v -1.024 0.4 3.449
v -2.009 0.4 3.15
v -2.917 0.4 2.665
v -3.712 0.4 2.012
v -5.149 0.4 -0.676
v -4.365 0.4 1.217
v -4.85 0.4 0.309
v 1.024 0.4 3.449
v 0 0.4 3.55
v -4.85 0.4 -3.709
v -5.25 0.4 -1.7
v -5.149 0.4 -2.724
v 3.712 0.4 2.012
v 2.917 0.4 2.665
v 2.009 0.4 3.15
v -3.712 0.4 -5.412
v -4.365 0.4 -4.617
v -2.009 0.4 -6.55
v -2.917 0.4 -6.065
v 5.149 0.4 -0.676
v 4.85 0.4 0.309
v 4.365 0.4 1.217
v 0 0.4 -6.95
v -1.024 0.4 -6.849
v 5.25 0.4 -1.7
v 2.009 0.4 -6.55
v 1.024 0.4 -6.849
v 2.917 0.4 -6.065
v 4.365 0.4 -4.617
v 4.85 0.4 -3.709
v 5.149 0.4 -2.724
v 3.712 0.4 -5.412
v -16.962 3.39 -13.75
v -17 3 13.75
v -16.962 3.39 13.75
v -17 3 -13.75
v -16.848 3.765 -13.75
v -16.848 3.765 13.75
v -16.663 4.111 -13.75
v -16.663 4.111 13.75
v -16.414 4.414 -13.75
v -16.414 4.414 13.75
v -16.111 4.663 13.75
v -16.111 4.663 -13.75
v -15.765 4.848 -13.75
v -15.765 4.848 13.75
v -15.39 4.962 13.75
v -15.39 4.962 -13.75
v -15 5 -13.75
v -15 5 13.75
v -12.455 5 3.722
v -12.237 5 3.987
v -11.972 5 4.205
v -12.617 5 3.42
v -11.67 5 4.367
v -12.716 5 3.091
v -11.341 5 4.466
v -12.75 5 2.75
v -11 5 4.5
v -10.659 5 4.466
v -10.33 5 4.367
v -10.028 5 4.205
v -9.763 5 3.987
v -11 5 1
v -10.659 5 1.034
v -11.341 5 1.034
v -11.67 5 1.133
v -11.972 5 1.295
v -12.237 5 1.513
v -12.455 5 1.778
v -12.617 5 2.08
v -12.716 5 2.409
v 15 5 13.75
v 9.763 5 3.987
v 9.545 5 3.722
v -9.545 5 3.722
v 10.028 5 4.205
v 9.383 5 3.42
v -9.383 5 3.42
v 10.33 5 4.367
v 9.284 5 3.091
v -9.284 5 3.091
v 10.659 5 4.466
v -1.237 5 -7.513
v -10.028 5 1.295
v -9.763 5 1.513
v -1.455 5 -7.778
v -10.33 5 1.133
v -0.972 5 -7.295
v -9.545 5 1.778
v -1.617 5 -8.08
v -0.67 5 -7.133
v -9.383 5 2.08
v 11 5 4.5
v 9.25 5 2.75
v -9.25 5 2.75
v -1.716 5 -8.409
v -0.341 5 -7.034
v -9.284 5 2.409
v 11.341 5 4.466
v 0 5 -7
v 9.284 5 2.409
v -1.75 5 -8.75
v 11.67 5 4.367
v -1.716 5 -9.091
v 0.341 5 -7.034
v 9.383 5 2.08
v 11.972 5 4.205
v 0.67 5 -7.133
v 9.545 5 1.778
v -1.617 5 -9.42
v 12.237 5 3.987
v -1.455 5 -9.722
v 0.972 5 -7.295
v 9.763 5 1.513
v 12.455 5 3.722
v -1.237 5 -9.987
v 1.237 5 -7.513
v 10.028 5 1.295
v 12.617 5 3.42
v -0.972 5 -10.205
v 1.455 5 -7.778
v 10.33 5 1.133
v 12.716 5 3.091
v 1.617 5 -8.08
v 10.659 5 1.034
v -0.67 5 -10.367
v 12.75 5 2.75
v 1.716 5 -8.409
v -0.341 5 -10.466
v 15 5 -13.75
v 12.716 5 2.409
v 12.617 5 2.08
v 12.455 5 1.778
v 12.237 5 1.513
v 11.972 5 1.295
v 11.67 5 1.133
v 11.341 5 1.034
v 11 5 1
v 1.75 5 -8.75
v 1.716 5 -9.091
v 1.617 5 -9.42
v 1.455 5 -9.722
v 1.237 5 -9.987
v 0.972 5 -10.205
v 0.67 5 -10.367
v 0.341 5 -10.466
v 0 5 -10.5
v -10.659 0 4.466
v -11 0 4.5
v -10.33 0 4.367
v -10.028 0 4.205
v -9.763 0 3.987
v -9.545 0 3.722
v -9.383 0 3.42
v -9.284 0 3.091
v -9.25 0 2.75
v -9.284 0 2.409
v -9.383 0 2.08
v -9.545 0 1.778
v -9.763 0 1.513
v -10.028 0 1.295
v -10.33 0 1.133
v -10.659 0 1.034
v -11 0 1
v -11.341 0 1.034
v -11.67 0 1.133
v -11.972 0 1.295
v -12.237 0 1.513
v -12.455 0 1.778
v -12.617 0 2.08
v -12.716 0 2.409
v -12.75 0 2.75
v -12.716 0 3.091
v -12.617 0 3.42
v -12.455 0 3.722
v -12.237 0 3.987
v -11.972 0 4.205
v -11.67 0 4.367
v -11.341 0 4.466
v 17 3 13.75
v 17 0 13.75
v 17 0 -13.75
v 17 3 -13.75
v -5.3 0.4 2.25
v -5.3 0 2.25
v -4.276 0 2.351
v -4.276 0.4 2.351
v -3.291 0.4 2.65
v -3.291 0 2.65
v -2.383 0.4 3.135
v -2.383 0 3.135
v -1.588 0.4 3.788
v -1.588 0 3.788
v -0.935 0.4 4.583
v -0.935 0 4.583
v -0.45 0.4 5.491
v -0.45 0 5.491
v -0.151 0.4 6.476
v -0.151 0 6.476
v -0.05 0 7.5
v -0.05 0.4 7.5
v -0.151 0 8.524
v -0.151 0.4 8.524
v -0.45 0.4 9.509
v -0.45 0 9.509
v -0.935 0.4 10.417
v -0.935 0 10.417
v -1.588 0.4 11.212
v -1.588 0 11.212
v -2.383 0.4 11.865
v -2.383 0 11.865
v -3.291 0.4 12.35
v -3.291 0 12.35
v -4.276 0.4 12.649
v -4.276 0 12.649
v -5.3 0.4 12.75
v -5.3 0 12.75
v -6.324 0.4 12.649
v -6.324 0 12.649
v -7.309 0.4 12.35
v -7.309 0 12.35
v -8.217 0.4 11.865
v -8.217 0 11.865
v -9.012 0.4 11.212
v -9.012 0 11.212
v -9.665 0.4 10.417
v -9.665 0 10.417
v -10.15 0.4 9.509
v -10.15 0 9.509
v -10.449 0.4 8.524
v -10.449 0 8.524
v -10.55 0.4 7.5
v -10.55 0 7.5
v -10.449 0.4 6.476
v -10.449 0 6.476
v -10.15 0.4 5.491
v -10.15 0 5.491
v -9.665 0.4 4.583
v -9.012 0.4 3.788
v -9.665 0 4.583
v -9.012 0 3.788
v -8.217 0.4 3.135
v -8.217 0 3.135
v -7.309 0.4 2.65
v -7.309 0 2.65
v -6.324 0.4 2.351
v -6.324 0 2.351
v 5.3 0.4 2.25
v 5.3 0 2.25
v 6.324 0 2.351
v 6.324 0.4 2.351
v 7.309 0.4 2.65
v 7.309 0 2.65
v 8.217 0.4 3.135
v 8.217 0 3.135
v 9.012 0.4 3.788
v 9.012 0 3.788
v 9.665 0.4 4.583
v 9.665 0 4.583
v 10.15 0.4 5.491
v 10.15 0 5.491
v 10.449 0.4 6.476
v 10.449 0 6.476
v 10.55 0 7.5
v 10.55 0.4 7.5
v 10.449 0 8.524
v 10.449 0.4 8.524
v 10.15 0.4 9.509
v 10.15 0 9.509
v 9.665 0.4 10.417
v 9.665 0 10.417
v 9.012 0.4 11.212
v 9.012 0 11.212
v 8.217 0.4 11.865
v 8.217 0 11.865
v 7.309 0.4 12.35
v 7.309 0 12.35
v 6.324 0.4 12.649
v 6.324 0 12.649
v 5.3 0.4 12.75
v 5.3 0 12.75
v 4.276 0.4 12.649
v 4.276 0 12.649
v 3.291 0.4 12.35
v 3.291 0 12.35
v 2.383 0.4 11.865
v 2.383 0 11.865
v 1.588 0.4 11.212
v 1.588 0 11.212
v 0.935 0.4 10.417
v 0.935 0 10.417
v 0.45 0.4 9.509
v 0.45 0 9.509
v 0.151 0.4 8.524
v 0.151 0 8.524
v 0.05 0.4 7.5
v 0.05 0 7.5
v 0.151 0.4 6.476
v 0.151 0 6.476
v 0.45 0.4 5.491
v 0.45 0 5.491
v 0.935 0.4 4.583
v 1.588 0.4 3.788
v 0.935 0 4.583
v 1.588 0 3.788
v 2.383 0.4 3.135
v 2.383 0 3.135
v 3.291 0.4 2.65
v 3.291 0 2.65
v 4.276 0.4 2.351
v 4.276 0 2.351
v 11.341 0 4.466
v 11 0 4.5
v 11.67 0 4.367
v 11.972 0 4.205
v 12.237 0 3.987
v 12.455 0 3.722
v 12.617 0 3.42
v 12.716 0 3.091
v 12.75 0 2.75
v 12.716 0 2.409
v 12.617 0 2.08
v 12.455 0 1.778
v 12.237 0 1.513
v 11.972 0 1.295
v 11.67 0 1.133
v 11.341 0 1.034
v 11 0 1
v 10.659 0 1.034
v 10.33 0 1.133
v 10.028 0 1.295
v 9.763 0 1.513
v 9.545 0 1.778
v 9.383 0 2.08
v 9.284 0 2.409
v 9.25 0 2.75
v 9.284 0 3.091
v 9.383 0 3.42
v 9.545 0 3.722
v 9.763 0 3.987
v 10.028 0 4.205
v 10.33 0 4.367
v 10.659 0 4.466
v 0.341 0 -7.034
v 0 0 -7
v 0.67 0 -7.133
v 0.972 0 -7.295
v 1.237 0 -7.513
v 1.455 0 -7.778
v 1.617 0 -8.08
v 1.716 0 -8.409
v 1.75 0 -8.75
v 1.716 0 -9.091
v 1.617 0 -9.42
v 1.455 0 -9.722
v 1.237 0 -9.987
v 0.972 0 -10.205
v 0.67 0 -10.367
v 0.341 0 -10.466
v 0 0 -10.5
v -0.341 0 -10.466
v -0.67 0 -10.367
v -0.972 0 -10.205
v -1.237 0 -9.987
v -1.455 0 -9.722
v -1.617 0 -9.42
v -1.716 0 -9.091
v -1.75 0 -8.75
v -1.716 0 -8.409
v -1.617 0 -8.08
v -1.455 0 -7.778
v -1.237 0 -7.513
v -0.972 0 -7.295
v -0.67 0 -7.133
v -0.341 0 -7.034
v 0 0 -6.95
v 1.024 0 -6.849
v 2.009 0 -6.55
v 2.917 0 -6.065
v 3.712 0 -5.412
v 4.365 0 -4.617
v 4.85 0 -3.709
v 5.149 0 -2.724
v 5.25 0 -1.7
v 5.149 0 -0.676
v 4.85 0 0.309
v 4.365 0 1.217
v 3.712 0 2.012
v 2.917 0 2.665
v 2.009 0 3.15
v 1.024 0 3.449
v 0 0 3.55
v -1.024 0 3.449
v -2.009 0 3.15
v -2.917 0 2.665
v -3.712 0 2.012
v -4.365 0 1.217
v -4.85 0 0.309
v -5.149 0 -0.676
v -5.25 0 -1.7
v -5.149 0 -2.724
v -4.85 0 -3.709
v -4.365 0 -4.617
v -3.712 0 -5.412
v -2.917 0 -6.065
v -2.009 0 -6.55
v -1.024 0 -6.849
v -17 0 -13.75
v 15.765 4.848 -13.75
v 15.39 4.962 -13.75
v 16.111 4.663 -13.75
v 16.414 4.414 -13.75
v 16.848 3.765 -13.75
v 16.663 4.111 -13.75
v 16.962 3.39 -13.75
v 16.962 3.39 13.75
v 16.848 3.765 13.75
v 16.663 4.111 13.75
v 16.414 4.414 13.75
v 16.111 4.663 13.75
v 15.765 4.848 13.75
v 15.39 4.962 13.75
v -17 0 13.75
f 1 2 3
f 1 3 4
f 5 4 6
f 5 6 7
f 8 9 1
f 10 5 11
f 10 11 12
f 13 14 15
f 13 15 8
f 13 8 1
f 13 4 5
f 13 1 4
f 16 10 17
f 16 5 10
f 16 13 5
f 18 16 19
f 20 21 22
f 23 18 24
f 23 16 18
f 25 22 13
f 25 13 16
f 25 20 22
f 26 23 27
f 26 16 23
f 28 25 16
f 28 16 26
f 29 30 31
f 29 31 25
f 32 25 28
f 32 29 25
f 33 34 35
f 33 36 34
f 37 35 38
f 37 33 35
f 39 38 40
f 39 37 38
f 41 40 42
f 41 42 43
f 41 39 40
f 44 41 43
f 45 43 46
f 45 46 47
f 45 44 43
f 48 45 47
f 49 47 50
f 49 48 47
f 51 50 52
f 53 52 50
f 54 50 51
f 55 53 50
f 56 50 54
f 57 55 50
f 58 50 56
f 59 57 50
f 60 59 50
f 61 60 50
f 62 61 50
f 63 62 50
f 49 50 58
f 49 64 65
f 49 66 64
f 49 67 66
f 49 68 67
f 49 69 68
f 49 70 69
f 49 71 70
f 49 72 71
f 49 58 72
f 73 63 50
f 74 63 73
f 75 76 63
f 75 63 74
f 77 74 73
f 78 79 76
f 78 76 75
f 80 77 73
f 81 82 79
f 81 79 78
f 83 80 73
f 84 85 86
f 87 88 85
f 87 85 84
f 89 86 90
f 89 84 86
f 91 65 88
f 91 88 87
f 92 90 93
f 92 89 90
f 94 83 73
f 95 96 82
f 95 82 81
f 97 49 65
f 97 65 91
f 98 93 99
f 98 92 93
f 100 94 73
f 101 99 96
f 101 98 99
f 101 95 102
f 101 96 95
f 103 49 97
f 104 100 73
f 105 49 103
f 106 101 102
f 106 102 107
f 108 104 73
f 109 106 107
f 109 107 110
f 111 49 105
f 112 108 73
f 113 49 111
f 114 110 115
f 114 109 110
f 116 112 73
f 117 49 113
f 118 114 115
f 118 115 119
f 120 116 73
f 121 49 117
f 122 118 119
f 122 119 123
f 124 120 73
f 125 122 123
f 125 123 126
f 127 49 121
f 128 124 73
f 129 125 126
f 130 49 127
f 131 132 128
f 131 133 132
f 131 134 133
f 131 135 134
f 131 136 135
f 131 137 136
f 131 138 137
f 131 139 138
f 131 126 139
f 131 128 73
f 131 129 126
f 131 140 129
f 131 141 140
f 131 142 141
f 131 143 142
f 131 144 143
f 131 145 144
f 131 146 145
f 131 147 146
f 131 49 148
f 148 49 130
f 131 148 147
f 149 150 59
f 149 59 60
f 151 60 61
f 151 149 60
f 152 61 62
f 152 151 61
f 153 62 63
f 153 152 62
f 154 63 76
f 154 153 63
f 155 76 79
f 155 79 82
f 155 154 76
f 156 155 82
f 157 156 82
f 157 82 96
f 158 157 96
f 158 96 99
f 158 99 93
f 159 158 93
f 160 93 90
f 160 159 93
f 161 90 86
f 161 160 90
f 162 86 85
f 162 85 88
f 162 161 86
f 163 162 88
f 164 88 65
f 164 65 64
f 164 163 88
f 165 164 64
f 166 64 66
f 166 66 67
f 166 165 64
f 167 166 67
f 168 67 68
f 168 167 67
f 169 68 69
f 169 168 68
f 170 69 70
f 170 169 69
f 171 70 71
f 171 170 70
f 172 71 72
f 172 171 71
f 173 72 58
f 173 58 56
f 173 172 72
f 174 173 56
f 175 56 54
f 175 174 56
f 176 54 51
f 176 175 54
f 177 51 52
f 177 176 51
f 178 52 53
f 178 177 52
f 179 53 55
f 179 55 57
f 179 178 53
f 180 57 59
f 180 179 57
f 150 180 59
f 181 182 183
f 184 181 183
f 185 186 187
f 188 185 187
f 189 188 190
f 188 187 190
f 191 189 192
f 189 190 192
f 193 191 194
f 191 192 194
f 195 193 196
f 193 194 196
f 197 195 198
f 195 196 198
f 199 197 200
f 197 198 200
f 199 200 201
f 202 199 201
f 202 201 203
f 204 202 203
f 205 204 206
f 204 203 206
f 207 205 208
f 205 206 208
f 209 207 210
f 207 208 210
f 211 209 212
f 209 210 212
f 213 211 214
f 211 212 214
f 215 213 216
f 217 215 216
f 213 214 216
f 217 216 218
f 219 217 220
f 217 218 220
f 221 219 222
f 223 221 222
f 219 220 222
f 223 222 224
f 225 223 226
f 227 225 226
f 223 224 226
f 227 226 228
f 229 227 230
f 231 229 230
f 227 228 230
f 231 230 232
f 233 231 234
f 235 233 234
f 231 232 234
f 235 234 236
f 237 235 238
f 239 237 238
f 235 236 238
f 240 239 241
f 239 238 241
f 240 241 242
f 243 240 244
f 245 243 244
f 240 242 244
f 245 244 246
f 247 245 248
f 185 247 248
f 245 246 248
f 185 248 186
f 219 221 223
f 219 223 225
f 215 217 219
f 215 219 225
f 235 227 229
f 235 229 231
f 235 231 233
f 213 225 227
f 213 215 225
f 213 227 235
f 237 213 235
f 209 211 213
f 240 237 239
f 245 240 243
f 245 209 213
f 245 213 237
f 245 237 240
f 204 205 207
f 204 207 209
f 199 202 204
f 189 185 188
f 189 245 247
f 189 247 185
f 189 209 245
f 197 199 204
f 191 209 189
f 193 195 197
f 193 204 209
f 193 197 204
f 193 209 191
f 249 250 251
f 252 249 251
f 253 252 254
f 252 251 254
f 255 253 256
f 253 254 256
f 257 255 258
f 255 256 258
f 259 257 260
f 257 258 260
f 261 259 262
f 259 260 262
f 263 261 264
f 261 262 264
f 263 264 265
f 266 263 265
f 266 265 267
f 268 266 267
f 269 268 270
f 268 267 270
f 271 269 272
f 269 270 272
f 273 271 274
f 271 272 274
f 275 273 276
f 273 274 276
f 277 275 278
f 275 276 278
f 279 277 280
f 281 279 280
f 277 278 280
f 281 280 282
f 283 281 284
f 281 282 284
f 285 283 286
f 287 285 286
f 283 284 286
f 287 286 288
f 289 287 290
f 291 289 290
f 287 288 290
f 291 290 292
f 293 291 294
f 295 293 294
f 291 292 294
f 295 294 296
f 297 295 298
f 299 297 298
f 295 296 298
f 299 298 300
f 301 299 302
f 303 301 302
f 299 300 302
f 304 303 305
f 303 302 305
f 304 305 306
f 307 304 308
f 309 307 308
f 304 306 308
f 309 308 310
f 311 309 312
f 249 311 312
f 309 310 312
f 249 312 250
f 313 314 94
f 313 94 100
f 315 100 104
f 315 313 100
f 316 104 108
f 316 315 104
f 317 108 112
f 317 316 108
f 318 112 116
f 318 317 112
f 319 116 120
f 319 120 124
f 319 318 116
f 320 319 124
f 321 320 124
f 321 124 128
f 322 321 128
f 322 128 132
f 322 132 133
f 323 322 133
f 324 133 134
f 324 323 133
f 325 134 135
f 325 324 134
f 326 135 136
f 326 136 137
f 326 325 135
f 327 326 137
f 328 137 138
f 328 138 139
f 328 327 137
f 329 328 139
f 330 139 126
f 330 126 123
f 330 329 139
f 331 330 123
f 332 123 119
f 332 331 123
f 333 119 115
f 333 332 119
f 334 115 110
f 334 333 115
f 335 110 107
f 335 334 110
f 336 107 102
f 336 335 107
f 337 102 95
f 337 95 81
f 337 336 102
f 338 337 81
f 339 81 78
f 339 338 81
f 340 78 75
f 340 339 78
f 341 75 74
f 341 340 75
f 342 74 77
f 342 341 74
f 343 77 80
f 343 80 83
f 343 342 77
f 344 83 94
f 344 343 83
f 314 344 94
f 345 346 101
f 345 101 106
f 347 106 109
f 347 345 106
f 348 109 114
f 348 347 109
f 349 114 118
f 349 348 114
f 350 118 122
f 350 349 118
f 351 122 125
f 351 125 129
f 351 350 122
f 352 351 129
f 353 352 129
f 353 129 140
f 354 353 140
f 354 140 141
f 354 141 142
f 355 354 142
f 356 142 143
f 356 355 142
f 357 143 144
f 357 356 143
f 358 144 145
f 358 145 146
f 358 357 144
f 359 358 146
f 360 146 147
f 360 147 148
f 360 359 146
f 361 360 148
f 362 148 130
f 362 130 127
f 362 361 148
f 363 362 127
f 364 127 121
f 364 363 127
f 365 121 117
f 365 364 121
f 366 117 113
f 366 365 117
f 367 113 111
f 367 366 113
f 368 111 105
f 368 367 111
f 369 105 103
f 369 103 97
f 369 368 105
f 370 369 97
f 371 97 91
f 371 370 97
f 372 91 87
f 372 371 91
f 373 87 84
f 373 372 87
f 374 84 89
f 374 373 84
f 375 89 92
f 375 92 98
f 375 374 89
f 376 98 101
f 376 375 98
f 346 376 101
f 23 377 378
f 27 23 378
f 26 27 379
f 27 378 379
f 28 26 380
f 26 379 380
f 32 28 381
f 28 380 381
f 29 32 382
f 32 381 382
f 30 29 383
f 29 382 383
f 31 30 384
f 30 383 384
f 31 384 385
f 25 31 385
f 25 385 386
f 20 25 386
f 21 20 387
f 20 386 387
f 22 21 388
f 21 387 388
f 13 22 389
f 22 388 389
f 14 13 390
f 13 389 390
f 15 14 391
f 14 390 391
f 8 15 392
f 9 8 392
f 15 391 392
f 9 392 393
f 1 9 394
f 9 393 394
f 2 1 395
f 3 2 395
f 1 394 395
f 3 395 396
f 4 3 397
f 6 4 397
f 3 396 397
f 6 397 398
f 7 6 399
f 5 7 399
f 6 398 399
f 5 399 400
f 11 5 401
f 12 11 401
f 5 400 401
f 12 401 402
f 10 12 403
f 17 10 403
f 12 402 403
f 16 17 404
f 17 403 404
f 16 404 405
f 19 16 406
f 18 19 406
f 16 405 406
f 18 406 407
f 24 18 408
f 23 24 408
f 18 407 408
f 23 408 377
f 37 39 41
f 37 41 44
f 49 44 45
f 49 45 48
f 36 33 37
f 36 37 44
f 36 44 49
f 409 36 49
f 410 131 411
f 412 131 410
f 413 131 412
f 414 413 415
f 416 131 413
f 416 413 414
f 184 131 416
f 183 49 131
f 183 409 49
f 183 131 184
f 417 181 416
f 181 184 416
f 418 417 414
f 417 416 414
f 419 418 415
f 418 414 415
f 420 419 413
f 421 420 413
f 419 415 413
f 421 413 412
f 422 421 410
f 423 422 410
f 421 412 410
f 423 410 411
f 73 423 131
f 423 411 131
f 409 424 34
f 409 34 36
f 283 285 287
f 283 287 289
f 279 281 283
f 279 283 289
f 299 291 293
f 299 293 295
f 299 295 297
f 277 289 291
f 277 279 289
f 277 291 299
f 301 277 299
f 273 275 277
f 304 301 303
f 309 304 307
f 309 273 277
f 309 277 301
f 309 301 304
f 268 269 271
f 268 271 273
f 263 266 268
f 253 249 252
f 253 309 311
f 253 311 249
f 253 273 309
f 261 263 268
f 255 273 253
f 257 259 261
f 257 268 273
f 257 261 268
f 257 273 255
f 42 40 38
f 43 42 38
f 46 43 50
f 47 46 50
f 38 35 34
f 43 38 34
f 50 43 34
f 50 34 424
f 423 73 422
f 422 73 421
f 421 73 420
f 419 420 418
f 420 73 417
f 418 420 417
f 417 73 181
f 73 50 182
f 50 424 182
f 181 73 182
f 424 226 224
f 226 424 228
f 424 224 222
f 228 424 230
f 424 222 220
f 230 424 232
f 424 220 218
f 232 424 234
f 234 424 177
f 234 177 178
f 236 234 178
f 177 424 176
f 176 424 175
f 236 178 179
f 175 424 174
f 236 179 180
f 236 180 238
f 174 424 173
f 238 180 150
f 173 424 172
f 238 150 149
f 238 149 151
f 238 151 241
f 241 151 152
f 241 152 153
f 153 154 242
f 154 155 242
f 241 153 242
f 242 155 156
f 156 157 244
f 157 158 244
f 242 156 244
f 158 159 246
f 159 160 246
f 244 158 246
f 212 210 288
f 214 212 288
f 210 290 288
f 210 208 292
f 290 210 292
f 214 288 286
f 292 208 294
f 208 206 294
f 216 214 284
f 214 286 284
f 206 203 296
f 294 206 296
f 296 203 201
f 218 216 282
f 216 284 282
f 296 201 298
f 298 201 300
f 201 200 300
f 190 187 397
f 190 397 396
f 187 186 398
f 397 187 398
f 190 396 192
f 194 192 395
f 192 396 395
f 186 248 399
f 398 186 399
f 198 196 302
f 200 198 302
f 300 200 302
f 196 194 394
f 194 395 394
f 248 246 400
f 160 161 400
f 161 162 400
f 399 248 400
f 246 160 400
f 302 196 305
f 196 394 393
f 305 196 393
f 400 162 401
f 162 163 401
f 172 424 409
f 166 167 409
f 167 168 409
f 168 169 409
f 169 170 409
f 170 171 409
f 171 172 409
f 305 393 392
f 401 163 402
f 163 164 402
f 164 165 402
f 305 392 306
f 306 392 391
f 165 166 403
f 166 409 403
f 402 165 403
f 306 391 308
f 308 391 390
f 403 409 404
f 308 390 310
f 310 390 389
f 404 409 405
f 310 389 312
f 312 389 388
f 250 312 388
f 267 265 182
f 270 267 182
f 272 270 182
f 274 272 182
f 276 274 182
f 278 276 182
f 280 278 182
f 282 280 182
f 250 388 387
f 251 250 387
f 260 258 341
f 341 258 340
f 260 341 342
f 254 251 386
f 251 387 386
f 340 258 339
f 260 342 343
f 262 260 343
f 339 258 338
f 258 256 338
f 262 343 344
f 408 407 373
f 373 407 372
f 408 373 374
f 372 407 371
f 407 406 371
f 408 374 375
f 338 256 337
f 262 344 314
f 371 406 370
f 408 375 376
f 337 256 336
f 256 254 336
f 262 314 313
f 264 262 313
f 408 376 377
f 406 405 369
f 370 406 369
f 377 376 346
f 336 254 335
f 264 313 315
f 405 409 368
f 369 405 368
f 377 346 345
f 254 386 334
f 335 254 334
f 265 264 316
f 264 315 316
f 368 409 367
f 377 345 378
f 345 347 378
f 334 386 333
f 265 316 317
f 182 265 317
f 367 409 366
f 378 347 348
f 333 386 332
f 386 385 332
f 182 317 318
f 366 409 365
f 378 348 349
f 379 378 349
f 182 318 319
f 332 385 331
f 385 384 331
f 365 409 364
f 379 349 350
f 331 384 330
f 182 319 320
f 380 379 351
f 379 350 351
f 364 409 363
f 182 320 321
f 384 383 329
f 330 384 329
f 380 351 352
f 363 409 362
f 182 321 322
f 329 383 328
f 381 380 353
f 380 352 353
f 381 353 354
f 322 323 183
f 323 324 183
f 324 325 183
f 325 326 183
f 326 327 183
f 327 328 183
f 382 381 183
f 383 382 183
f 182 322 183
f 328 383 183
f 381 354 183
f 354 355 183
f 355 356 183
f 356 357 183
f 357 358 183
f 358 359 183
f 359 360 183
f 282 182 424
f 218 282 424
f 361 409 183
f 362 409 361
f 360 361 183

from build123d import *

# Parameters (mm, degrees)
SKETCH1_W           = 34
SKETCH1_H           = 27.5
SKETCH1_R           = 1.75
BOSS_EXTRUDE1_DEPTH = 5
FILLET1_R           = 2
SKETCH2_R           = 5.25
CUT_EXTRUDE1_DEPTH  = 0.4


with BuildPart() as part:
    # Sketch1 → Boss-Extrude1 (new body)
    with BuildSketch(Plane(origin=(0, 0, 0), x_dir=(1, 0, 0), z_dir=(0, 1, 0))):
        Rectangle(SKETCH1_W, SKETCH1_H)
        with Locations(Location((0, 8.75, 0), (0, 0, 270))):
            Circle(SKETCH1_R, mode=Mode.SUBTRACT)
        with Locations(Location((-11, -2.75, 0), (0, 0, 270))):
            Circle(SKETCH1_R, mode=Mode.SUBTRACT)
        with Locations(Location((11, -2.75, 0), (0, 0, 270))):
            Circle(SKETCH1_R, mode=Mode.SUBTRACT)
    extrude(amount=BOSS_EXTRUDE1_DEPTH)

    # Fillet1
    fillet1_edges = [part.edges().sort_by_distance(p)[0] for p in [
        (-17, 5, 0),
        (17, 5, 0),
    ]]
    fillet(fillet1_edges, radius=FILLET1_R)

    # Sketch2 → Cut-Extrude1 (cut)
    with BuildSketch(Plane.XZ):
        with Locations(Location((-5.3, 7.5, 0), (0, 0, 270))):
            Circle(SKETCH2_R)
        with Locations(Location((5.3, 7.5, 0), (0, 0, 270))):
            Circle(SKETCH2_R)
        with Locations(Location((0, -1.7, 0), (0, 0, 270))):
            Circle(SKETCH2_R)
    extrude(amount=-CUT_EXTRUDE1_DEPTH, mode=Mode.SUBTRACT)


solid = part.part
